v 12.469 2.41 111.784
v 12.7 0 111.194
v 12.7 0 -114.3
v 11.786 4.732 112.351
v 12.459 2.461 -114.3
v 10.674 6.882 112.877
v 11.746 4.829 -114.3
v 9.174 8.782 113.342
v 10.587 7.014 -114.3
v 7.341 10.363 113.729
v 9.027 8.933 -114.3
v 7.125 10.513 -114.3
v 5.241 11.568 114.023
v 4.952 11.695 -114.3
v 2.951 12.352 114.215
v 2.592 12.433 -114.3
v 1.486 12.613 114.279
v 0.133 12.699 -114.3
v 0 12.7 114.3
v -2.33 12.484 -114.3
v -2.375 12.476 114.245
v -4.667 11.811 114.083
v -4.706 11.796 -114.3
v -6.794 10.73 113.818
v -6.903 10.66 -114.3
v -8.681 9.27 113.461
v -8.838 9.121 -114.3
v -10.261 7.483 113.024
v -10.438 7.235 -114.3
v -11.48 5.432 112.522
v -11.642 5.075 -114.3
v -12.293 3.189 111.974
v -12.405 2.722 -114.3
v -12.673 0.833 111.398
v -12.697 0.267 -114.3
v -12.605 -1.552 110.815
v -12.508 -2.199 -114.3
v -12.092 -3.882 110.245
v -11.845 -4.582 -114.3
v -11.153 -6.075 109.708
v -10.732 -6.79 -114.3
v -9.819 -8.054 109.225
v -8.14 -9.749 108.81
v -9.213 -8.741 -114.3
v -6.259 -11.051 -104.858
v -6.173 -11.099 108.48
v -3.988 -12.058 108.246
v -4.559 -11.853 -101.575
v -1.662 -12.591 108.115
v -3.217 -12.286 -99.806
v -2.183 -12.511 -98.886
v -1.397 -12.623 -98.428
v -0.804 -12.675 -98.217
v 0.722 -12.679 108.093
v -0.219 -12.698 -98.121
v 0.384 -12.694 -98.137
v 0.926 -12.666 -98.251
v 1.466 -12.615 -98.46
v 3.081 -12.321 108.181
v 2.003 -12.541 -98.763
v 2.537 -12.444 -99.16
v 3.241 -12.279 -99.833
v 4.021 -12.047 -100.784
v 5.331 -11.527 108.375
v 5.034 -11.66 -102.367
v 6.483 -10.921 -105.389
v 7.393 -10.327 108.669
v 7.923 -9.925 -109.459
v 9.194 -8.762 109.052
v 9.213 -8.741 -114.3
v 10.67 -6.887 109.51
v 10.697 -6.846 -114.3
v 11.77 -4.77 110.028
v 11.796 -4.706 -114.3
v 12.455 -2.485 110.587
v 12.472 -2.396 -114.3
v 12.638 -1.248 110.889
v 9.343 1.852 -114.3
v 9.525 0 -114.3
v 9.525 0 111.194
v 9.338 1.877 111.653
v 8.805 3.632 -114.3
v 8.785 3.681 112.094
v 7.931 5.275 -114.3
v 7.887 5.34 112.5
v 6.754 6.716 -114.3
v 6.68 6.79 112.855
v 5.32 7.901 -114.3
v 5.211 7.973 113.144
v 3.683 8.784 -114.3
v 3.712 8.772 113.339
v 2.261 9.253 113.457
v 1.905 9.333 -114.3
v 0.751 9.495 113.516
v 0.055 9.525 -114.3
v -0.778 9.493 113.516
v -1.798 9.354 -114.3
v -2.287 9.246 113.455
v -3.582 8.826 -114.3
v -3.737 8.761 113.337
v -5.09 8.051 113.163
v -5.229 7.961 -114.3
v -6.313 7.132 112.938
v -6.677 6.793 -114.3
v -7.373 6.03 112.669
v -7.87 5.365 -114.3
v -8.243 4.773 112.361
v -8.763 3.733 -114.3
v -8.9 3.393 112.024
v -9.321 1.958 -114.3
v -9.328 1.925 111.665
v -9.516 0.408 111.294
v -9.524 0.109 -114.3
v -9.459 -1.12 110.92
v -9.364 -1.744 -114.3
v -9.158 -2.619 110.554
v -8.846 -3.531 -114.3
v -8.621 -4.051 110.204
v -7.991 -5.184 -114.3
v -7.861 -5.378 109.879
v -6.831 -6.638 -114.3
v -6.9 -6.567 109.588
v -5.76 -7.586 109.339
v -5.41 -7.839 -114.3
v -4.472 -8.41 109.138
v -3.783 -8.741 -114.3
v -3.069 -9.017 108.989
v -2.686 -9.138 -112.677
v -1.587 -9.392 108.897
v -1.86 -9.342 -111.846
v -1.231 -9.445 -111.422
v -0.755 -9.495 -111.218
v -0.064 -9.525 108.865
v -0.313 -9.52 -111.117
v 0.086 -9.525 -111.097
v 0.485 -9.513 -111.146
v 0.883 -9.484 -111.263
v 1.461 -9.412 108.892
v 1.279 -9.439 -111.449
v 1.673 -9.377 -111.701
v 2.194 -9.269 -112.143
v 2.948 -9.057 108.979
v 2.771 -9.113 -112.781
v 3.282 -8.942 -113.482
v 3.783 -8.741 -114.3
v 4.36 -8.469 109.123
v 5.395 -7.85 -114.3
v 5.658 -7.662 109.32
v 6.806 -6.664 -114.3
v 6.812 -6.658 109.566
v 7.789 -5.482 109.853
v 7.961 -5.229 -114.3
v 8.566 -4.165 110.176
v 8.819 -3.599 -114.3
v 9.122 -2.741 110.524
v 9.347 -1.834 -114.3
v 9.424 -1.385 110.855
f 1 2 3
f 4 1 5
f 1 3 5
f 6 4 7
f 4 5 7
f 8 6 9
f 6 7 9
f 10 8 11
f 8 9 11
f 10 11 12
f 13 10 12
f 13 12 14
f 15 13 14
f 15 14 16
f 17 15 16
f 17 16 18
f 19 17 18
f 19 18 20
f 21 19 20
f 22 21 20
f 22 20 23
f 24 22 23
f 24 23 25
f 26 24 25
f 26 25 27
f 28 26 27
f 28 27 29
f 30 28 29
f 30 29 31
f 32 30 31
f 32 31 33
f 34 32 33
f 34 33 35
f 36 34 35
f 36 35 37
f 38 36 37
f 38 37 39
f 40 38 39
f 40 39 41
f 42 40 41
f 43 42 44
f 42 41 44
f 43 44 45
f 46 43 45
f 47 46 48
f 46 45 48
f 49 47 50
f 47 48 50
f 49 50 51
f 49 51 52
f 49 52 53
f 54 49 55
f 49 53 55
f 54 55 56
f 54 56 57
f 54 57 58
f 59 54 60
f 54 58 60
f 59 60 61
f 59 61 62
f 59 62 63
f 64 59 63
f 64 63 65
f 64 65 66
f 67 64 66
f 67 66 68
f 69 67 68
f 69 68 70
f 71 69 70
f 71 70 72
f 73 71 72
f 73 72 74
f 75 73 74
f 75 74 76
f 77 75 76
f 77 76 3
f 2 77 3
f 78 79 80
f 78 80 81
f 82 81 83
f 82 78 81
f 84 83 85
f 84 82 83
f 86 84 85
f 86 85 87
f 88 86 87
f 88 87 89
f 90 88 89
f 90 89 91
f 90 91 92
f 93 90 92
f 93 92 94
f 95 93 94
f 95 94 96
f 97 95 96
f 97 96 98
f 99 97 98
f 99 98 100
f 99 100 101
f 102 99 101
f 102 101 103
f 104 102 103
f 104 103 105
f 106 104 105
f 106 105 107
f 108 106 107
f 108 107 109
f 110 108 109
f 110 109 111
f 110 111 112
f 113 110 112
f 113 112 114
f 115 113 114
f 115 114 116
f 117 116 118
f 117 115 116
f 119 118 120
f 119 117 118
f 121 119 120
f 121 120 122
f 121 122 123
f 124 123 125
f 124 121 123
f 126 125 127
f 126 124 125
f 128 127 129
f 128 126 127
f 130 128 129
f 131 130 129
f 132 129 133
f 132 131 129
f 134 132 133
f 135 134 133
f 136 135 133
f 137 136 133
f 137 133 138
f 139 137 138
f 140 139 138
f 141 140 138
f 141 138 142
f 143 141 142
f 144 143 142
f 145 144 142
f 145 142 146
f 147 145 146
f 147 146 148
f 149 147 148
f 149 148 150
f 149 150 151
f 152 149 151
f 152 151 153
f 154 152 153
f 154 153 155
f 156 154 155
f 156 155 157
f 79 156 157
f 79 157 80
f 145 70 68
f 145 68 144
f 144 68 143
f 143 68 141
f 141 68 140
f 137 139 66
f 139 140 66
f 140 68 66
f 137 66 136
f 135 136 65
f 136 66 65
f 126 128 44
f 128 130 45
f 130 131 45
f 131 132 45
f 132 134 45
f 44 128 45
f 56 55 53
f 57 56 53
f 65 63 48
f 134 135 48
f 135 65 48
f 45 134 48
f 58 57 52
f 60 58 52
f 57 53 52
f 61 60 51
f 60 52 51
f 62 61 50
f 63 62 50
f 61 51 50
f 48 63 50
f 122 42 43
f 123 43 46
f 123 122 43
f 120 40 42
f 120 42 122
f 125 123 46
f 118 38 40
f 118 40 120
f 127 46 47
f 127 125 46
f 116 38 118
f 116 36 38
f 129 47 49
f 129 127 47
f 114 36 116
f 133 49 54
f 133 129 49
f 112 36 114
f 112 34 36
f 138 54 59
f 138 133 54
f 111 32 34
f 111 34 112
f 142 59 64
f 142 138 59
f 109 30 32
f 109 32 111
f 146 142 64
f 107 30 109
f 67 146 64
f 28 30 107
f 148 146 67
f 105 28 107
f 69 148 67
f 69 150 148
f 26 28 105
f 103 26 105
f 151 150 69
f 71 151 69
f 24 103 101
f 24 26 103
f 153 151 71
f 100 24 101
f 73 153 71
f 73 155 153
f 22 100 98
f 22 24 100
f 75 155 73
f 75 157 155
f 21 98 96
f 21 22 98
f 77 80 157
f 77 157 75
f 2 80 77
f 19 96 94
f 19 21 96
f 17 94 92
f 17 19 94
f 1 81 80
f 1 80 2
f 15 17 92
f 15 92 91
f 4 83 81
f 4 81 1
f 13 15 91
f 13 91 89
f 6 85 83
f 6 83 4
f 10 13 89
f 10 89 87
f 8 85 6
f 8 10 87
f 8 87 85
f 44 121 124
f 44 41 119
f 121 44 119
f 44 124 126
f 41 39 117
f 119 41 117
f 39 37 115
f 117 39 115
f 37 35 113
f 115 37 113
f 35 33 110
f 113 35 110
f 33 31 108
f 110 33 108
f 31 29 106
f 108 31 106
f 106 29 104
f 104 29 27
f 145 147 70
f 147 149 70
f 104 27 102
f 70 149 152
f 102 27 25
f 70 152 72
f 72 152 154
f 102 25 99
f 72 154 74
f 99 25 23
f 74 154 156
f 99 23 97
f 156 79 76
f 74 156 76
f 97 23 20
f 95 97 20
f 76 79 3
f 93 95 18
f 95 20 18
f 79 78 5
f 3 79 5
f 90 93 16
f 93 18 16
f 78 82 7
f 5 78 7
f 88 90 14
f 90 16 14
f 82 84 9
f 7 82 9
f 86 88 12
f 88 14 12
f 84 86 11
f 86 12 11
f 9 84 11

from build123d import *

# Parameters (mm, degrees)
BOSS_EXTRUDE1_DEPTH      = 114.3
BOSS_EXTRUDE1_DEPTH_BACK = 114.3
SKETCH3_R                = 12.7
SKETCH3_R_2              = 9.525


with BuildPart() as part:
    # Sketch3 → Boss-Extrude1 (new, two sides: drawn at the far end of the back side and taken through both)
    with BuildSketch(Plane.XY.offset(-BOSS_EXTRUDE1_DEPTH_BACK)):
        Circle(SKETCH3_R)
        Circle(SKETCH3_R_2, mode=Mode.SUBTRACT)
    extrude(amount=BOSS_EXTRUDE1_DEPTH + BOSS_EXTRUDE1_DEPTH_BACK)

    # SurfaceCut1
    split(bisect_by=Plane(origin=(0, -25.658113523, 104.919505636), x_dir=(1, 0, 0), z_dir=(0, -0.23755026507145888, 0.9713752475559997)), keep=Keep.BOTTOM)

    # SurfaceCut2
    split(bisect_by=Plane(origin=(0, -34.6229304, -8.467053608), x_dir=(-1, 0, 0), z_dir=(0, 0.9713752475559997, 0.23755026507145888)), keep=Keep.TOP)


solid = part.part
